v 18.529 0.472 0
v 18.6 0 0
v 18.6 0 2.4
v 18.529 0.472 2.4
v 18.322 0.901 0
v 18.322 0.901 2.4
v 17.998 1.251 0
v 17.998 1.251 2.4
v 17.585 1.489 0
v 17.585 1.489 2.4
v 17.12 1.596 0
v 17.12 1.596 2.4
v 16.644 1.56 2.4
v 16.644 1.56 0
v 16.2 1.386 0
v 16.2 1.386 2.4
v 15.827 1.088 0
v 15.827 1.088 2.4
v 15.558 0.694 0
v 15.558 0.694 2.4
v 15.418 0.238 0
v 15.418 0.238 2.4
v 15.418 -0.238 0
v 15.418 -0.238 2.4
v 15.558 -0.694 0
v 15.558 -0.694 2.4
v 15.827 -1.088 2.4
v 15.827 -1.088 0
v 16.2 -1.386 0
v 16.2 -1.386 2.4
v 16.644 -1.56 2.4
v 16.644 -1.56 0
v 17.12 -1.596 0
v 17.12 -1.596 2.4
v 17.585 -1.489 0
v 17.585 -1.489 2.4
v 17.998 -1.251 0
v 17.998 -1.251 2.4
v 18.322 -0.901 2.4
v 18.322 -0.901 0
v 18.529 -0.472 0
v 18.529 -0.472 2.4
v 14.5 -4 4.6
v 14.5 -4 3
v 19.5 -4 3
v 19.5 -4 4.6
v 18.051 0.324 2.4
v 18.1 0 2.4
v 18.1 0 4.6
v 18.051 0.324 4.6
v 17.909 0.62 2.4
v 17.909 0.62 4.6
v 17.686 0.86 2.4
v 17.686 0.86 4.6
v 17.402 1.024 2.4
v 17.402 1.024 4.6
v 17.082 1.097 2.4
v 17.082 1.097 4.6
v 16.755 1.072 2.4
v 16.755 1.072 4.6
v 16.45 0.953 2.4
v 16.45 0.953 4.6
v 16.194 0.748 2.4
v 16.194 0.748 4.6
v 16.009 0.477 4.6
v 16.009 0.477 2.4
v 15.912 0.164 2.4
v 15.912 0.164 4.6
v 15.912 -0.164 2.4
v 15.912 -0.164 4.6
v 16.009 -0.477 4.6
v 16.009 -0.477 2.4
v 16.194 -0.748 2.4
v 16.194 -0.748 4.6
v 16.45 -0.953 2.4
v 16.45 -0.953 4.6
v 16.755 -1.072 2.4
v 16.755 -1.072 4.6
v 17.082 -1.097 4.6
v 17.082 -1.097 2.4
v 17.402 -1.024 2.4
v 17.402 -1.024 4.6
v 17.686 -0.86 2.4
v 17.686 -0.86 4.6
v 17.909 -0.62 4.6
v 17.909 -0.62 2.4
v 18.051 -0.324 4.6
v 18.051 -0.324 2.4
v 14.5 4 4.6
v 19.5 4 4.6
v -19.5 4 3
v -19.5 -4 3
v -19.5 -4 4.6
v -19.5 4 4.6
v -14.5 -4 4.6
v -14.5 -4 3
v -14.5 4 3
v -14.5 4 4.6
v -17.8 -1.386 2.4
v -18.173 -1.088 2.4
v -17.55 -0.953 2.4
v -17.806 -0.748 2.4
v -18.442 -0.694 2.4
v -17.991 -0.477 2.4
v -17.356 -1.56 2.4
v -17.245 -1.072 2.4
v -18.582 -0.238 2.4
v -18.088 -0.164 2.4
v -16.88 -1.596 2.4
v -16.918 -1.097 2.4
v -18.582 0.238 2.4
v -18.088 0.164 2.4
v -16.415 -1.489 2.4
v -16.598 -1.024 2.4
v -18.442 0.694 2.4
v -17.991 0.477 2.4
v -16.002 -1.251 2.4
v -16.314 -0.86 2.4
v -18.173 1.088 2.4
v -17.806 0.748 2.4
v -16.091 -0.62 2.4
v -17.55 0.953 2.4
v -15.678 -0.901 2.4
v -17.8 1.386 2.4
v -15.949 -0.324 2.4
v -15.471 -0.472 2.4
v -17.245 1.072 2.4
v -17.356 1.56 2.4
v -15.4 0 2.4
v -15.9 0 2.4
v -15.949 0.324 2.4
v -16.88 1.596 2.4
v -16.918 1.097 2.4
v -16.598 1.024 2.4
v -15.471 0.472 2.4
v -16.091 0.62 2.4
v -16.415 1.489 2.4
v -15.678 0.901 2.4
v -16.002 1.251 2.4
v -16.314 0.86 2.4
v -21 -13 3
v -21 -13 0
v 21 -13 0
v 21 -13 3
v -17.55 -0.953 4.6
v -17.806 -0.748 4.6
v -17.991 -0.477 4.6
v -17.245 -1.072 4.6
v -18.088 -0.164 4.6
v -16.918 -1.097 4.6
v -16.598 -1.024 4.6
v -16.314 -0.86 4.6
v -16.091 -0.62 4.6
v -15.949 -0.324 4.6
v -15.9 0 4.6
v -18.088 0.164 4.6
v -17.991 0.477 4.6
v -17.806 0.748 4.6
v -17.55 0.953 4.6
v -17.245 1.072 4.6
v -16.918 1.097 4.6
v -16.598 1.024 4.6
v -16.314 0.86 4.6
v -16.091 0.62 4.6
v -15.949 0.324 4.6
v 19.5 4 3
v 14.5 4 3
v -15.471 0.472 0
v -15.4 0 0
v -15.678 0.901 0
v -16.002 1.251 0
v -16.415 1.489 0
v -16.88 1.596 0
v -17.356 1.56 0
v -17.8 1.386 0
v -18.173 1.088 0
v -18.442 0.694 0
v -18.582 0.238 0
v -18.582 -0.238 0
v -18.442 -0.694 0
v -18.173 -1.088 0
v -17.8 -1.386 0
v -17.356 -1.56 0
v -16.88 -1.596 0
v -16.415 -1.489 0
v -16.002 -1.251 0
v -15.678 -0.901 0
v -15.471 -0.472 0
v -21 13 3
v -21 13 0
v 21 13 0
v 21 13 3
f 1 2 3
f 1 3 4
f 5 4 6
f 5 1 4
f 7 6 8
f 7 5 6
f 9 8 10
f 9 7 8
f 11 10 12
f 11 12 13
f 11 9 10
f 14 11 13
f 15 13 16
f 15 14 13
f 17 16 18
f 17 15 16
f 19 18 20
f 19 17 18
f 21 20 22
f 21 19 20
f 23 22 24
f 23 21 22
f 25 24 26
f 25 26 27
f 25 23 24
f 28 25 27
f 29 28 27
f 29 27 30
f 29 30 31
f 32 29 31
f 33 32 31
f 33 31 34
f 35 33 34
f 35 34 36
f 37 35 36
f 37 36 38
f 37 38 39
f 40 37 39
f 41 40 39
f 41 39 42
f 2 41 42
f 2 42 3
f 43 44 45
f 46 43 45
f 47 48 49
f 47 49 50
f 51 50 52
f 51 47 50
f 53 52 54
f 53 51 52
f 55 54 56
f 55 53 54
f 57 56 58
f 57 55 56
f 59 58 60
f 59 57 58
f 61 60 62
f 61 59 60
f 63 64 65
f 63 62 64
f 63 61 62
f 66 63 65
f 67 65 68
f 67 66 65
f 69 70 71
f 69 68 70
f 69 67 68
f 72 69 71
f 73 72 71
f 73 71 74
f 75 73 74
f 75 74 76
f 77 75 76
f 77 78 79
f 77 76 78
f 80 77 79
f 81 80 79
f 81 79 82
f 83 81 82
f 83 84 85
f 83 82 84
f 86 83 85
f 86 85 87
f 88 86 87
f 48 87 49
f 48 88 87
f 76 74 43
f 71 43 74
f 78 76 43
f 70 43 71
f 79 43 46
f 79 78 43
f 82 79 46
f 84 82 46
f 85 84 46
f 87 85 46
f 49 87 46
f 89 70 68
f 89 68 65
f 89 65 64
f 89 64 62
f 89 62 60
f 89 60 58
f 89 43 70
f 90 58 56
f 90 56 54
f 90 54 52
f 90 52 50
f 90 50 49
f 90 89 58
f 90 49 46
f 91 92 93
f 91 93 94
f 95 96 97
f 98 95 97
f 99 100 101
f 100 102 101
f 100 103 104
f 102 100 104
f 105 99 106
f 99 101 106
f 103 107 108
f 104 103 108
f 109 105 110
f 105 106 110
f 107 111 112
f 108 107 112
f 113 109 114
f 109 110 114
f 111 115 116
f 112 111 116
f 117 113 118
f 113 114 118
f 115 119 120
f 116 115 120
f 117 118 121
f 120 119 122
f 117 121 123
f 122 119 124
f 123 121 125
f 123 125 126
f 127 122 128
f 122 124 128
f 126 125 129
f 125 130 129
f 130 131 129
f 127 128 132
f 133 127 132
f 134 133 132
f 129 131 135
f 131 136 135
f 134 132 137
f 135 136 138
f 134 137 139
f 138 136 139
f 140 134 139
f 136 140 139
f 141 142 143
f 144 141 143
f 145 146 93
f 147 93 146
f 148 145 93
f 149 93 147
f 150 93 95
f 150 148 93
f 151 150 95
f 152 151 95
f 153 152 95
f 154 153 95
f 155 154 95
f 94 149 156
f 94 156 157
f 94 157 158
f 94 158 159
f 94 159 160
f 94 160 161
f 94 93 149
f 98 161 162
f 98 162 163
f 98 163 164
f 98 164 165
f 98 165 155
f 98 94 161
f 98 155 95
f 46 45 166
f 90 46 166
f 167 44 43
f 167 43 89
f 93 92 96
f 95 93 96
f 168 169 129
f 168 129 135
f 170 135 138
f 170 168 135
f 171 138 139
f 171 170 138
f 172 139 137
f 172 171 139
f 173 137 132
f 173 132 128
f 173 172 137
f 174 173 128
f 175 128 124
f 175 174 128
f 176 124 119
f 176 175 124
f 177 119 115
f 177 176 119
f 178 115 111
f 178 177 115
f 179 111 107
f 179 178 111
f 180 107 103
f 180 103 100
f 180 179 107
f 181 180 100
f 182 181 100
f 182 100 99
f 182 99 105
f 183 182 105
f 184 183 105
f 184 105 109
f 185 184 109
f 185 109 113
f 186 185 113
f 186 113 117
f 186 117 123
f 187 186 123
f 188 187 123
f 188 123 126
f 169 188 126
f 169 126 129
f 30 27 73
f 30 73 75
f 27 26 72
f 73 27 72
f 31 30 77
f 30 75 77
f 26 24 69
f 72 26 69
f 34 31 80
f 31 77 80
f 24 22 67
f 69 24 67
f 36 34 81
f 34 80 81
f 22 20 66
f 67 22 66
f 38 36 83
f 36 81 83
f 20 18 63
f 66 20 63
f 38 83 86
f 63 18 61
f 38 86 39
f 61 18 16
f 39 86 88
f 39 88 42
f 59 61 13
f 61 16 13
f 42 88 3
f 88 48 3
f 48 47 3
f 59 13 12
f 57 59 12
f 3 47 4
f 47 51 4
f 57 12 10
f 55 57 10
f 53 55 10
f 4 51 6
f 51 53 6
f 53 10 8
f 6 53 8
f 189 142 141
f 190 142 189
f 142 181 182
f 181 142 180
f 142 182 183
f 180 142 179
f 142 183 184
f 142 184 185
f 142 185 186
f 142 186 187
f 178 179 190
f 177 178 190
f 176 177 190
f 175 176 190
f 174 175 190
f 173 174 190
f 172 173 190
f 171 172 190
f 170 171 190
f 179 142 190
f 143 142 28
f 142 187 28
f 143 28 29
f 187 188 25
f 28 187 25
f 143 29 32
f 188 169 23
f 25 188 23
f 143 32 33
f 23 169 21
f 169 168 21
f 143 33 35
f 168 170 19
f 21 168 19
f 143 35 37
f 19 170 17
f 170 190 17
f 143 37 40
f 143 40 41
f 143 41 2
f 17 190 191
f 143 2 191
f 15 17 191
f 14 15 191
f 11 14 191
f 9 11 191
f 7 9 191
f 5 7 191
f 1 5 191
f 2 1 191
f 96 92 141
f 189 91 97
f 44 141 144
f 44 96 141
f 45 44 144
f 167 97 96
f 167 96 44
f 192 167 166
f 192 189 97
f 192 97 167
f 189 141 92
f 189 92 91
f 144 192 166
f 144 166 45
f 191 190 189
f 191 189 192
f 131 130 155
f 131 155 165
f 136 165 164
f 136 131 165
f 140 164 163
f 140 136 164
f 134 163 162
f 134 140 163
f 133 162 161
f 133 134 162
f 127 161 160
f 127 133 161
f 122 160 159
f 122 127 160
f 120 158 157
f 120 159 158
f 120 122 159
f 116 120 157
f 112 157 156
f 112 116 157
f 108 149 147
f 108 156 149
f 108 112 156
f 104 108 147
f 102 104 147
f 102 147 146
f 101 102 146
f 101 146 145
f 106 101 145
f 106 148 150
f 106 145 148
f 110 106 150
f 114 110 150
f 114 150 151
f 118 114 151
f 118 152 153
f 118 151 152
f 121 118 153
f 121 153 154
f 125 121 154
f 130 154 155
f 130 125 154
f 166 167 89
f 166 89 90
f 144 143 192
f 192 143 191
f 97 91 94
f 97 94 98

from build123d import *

# Parameters (mm, degrees)
MOUNTING_PLATE_SKETCH_W       = 42
MOUNTING_PLATE_SKETCH_H       = 26
MOUNTING_PLATE_DEPTH          = 3
CLAMP_SEAT_1_SKETCH_W         = 5
CLAMP_SEAT_1_SKETCH_H         = 8
CLAMP_SEAT_1_DEPTH            = 1.7
M2_SCREW_CLEARANCE_1_SKETCH_R = 1.1
M2_SCREW_CLEARANCE_1_DEPTH    = 4.8
M2_INSERT_POCKET_1_SKETCH_R   = 1.6
M2_INSERT_POCKET_1_DEPTH      = 2.5
CLAMP_SEAT_2_SKETCH_W         = 5
CLAMP_SEAT_2_SKETCH_H         = 8
CLAMP_SEAT_2_DEPTH            = 1.7
M2_SCREW_CLEARANCE_2_SKETCH_R = 1.1
M2_SCREW_CLEARANCE_2_DEPTH    = 4.8
M2_INSERT_POCKET_2_SKETCH_R   = 1.6
M2_INSERT_POCKET_2_DEPTH      = 2.5


with BuildPart() as part:
    # Mounting Plate Sketch → Mounting Plate (new body)
    with BuildSketch(Plane.XY):
        Rectangle(MOUNTING_PLATE_SKETCH_W, MOUNTING_PLATE_SKETCH_H)
    extrude(amount=MOUNTING_PLATE_DEPTH)

    # Clamp Seat 1 Sketch → Clamp Seat 1 (add)
    with BuildSketch(Plane.XY.offset(2.9)):
        with Locations((-17, 0)):
            Rectangle(CLAMP_SEAT_1_SKETCH_W, CLAMP_SEAT_1_SKETCH_H)
    extrude(amount=CLAMP_SEAT_1_DEPTH)

    # M2 Screw Clearance 1 Sketch → M2 Screw Clearance 1 (cut)
    with BuildSketch(Plane.XY.offset(-0.1)):
        with Locations((-17, 0)):
            Circle(M2_SCREW_CLEARANCE_1_SKETCH_R)
    extrude(amount=M2_SCREW_CLEARANCE_1_DEPTH, mode=Mode.SUBTRACT)

    # M2 Insert Pocket 1 Sketch → M2 Insert Pocket 1 (cut)
    with BuildSketch(Plane.XY.offset(-0.1)):
        with Locations((-17, 0)):
            Circle(M2_INSERT_POCKET_1_SKETCH_R)
    extrude(amount=M2_INSERT_POCKET_1_DEPTH, mode=Mode.SUBTRACT)

    # Clamp Seat 2 Sketch → Clamp Seat 2 (add)
    with BuildSketch(Plane.XY.offset(2.9)):
        with Locations((17, 0)):
            Rectangle(CLAMP_SEAT_2_SKETCH_W, CLAMP_SEAT_2_SKETCH_H)
    extrude(amount=CLAMP_SEAT_2_DEPTH)

    # M2 Screw Clearance 2 Sketch → M2 Screw Clearance 2 (cut)
    with BuildSketch(Plane.XY.offset(-0.1)):
        with Locations((17, 0)):
            Circle(M2_SCREW_CLEARANCE_2_SKETCH_R)
    extrude(amount=M2_SCREW_CLEARANCE_2_DEPTH, mode=Mode.SUBTRACT)

    # M2 Insert Pocket 2 Sketch → M2 Insert Pocket 2 (cut)
    with BuildSketch(Plane.XY.offset(-0.1)):
        with Locations((17, 0)):
            Circle(M2_INSERT_POCKET_2_SKETCH_R)
    extrude(amount=M2_INSERT_POCKET_2_DEPTH, mode=Mode.SUBTRACT)


solid = part.part
